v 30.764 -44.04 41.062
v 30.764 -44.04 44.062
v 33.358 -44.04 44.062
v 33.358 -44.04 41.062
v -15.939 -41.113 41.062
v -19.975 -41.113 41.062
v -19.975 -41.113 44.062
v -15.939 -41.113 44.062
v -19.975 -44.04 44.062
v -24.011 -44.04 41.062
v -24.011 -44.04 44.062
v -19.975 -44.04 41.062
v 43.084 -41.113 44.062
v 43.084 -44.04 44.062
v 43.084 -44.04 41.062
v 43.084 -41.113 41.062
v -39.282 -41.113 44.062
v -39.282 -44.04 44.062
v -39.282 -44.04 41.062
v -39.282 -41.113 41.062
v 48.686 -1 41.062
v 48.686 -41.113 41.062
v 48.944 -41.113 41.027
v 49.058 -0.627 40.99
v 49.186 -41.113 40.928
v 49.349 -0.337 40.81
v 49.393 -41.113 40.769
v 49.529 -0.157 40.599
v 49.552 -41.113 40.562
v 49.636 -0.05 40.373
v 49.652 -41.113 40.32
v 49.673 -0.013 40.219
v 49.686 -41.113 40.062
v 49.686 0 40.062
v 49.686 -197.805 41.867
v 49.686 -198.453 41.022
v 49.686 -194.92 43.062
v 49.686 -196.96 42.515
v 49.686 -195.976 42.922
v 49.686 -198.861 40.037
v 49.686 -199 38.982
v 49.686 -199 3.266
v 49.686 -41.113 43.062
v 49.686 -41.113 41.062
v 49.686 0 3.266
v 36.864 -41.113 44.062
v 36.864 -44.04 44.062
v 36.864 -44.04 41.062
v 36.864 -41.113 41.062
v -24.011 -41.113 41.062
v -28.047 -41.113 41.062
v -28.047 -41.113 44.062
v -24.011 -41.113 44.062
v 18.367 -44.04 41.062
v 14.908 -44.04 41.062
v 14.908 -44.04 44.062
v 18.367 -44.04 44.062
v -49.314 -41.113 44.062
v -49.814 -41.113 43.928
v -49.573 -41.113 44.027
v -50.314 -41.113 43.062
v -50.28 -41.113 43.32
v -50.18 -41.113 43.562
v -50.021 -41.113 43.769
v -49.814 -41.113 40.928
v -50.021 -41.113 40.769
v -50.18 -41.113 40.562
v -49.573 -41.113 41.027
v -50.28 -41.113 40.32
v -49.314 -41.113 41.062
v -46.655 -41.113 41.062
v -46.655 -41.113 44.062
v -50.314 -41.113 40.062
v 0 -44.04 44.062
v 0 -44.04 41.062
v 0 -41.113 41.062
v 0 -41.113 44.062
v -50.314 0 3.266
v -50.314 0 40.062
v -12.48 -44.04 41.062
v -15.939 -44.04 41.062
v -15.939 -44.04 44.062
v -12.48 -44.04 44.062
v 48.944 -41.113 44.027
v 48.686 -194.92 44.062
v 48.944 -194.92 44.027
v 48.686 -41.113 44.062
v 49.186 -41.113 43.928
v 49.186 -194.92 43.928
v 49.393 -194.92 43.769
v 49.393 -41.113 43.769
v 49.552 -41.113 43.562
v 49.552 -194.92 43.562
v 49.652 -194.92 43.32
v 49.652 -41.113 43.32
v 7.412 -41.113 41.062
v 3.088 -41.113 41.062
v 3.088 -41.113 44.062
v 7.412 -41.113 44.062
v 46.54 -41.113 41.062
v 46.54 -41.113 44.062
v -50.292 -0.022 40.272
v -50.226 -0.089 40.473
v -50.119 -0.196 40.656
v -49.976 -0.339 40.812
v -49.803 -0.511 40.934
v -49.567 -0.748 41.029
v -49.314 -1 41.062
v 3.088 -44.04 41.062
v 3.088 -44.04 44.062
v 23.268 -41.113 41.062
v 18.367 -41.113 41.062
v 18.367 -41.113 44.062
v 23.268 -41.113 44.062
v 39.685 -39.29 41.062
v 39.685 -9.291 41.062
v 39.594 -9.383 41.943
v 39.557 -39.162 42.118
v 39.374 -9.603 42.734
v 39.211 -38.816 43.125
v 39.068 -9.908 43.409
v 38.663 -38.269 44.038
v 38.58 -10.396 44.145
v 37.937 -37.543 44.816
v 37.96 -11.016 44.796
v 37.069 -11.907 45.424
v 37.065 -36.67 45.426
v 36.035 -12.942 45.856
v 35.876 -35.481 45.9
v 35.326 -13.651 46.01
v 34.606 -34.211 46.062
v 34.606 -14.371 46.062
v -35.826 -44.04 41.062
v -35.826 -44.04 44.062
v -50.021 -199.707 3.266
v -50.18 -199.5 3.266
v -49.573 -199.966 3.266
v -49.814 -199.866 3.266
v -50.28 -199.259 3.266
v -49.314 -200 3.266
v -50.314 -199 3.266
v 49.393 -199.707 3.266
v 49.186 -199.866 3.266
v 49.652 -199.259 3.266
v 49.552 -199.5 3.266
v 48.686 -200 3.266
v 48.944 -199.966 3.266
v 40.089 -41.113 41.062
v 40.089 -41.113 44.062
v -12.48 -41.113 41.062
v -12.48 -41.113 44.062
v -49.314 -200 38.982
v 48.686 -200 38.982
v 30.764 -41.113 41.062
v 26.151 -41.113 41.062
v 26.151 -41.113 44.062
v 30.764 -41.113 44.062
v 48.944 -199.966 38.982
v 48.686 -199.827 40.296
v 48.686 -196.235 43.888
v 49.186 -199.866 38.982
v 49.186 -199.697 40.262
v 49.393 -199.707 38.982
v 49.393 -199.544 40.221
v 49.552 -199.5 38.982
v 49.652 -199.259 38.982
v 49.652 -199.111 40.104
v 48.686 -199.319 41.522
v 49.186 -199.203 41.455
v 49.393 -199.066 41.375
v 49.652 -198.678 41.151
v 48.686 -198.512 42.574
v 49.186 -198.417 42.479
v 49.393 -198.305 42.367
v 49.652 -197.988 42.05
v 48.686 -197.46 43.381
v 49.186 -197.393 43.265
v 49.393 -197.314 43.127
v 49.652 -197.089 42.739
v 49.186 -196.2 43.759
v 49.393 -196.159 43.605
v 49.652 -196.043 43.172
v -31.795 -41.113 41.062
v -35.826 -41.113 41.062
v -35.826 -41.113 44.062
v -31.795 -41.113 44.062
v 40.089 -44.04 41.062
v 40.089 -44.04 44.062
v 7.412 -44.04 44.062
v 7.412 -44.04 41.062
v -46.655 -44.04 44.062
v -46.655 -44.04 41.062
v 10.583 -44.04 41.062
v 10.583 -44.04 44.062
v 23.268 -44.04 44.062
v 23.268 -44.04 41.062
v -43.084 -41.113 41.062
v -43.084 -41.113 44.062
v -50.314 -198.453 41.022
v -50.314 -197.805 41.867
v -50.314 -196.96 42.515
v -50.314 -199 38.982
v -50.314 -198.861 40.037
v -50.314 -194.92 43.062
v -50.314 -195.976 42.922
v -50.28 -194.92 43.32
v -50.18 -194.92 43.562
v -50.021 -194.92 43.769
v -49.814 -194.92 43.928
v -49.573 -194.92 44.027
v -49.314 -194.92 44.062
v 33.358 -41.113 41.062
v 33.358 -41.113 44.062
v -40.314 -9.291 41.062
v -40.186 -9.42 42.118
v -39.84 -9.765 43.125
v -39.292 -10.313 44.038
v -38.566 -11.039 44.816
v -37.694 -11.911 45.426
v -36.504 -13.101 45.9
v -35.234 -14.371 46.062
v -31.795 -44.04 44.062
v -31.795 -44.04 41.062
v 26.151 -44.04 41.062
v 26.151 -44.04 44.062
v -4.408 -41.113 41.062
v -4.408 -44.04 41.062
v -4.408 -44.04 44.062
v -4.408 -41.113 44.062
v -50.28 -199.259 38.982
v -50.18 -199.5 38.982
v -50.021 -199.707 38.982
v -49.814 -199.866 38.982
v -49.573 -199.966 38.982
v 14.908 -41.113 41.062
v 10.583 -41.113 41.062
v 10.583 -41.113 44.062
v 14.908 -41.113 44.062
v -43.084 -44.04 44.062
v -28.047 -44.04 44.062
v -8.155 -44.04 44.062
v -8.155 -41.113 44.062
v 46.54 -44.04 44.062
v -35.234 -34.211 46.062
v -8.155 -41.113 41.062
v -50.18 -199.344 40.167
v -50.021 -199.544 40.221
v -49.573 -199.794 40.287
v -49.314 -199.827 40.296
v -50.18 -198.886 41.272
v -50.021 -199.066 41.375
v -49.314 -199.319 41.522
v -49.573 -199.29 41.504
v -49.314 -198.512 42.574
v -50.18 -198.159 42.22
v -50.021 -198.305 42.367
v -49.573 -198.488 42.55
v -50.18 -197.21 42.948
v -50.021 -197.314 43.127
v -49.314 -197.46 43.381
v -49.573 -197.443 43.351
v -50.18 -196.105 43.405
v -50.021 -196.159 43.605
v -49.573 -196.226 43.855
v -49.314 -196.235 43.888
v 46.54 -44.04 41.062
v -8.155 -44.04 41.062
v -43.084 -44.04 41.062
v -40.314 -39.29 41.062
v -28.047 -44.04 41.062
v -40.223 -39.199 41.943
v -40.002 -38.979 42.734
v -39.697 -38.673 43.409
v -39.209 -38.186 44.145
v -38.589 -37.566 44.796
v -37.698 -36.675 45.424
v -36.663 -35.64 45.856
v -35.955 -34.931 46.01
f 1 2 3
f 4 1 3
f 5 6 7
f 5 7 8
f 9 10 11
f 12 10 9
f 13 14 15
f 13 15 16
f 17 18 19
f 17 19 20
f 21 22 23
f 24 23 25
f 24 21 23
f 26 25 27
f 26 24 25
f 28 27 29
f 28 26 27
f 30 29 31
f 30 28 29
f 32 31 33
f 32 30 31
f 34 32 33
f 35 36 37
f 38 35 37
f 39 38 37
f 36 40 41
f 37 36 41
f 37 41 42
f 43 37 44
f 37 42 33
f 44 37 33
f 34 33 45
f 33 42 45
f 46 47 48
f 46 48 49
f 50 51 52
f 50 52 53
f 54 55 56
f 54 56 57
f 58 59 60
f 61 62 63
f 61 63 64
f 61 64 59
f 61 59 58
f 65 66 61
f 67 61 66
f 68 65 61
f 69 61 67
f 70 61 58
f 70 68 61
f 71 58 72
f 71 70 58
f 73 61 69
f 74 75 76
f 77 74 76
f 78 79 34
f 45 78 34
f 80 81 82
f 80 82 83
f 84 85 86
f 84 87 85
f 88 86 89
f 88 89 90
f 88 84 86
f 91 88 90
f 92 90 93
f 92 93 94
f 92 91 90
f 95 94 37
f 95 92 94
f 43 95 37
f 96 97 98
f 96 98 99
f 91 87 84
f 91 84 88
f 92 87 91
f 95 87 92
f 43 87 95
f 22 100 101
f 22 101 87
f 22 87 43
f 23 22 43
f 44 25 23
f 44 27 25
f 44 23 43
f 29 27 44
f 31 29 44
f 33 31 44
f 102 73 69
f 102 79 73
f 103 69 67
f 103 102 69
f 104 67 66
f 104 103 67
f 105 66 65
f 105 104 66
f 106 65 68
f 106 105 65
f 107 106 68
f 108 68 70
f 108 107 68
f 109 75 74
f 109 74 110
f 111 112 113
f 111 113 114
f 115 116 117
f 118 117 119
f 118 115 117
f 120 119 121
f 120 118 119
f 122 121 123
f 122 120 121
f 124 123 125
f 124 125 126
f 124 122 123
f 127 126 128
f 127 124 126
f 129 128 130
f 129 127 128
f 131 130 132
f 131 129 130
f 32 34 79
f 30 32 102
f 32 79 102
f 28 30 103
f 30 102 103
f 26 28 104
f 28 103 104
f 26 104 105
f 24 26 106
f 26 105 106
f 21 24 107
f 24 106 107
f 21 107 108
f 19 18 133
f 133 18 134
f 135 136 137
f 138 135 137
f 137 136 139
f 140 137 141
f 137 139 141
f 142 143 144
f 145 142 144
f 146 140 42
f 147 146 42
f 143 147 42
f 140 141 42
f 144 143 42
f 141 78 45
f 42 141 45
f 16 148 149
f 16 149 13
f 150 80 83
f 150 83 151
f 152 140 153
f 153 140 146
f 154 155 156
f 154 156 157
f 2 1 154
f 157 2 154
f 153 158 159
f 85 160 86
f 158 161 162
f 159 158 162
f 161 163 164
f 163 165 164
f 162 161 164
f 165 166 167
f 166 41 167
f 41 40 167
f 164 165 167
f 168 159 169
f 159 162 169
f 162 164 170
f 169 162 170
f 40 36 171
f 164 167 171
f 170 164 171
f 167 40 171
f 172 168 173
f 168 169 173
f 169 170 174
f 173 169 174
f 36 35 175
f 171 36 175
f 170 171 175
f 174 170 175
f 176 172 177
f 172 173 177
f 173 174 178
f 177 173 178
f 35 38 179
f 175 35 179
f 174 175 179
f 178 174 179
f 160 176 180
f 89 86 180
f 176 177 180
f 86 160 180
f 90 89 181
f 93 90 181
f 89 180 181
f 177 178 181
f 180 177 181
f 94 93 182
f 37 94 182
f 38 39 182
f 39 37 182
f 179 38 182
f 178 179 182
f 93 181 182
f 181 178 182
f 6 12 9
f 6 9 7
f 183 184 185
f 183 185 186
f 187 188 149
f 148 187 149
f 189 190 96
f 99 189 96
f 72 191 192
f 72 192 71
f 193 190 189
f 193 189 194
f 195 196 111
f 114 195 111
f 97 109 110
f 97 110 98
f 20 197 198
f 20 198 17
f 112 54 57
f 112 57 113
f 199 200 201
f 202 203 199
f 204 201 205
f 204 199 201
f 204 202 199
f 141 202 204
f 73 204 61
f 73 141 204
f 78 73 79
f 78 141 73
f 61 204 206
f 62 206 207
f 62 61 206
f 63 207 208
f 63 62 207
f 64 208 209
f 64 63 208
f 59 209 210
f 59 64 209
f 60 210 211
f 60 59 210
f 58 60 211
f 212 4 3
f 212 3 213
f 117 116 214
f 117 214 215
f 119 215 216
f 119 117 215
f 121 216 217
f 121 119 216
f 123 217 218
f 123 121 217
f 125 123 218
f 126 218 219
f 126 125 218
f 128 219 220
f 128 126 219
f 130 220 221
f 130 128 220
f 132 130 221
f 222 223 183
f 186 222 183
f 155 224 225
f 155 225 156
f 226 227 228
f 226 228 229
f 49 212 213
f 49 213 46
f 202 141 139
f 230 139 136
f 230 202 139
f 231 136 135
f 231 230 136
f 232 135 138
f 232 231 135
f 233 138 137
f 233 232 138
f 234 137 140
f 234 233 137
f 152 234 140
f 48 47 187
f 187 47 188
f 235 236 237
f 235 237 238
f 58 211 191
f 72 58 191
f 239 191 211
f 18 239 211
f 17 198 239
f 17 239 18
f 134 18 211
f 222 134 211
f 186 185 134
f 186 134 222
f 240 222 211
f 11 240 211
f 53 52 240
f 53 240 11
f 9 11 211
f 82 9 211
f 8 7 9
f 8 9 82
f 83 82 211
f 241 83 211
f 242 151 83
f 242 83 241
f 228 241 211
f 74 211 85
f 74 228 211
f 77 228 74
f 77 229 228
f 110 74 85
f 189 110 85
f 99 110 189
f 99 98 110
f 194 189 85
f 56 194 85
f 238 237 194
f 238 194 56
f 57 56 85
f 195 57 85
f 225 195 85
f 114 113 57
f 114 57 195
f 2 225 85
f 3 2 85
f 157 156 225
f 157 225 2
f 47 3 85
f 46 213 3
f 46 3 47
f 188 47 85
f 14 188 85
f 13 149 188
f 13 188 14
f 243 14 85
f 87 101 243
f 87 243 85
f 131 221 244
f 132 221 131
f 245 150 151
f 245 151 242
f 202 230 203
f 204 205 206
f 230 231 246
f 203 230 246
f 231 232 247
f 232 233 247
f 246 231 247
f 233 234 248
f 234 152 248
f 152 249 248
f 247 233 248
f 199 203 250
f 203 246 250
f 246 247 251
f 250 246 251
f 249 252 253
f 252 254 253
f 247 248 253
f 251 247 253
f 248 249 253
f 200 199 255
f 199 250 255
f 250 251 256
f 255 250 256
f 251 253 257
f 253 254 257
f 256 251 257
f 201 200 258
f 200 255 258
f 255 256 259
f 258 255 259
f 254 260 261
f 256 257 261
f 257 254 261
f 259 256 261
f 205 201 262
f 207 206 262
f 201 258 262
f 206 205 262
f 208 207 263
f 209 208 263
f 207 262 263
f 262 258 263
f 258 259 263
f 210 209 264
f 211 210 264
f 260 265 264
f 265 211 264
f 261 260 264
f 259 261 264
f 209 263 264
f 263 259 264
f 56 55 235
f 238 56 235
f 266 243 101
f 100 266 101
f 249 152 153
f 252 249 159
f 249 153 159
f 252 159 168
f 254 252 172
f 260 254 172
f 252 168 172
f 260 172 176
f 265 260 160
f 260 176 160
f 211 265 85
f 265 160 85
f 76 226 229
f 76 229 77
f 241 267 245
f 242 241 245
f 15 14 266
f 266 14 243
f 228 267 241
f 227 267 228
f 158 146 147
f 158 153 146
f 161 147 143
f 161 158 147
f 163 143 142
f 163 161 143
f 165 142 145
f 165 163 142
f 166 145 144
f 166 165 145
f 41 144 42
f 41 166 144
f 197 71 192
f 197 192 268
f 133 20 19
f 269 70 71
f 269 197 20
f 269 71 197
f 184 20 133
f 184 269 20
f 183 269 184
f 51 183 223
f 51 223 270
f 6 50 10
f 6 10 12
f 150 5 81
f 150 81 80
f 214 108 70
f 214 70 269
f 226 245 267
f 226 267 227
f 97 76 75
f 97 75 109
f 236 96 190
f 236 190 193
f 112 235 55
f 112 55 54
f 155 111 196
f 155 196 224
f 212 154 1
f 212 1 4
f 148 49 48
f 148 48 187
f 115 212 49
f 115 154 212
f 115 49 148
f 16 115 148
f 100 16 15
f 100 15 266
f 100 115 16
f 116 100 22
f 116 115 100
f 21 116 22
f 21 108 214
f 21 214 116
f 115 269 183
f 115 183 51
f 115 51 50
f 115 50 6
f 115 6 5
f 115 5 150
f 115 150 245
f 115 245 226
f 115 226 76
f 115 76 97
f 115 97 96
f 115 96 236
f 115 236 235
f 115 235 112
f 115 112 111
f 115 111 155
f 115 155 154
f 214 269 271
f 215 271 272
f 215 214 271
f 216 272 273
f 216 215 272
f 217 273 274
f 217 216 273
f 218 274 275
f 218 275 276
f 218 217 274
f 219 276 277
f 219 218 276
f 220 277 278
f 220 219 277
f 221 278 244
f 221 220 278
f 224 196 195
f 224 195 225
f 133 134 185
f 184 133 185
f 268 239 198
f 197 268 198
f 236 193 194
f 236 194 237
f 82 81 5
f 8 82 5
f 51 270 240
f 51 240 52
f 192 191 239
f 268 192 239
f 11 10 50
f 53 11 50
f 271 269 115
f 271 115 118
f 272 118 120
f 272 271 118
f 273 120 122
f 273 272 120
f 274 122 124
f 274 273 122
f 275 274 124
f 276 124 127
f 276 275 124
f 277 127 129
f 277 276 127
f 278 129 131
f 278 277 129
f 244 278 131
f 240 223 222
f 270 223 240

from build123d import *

# Parameters (mm, degrees)
F0_W         = 100
F0_H         = 37.7952754252
F1_DEPTH     = 200
F2_W         = 80
F2_H         = 30
F3_DEPTH     = 5
F4_T4_DEPTH  = 55.4
F4_T9_DEPTH  = 105.4
F4_T14_DEPTH = 55.4
F4_T19_DEPTH = 105.4
F5_W         = 100
F5_H         = 155.959841609
F6_DEPTH     = 3
F7_W         = 18.5192480683
F7_H         = 2.9272809625
F7_W_2       = 4.0360428393
F7_W_3       = 4.3243318796
F7_W_4       = 4.4076992199
F7_W_5       = 4.324331414
F7_W_6       = 4.9009080976
F7_W_7       = 4.6126190573
F7_W_8       = 16.3274921477
F8_DEPTH     = 3
F9_W         = 3.4559369087
F9_H         = 2.9272809625
F9_W_2       = 3.5711340606
F9_W_3       = 3.2255388796
F10_DEPTH    = 3
F11_R        = 5.08
F12_R        = 1


# Not quite as in the source:
# - a fillet or chamfer that OpenCascade refuses, or shapes differently, is made with other operations: its cross-section is extruded or revolved along the edge and cut away or added


with BuildPart() as f1:
    # F0 (on Front) → F1 (new body)
    with BuildSketch(Plane.XZ):
        with Locations((-0.3143809736, 22.1638707444)):
            Rectangle(F0_W, F0_H)
    extrude(amount=F1_DEPTH)

    # F2 (on face) → F3 (join)
    with BuildSketch(Plane.XY.offset(41.061508457)):
        with Locations((-0.3143809736, -24.2907730862)):
            Rectangle(F2_W, F2_H)
    extrude(amount=F3_DEPTH)

    # F4: fillet of radius 5.08 on 4 edges, made by hand


with BuildPart() as f4_tool2:
    # F4_s3 → F4_t4 (new body)
    with BuildSketch(Plane.XZ.offset(51.9907730862)):
        with BuildLine():
            ThreePointArc((39.6856190264, 40.981508457), (38.1977214749, 44.5736109055), (34.6056190264, 46.061508457))
            Line((34.6056190264, 46.061508457), (39.6856190264, 46.061508457))
            Line((39.6856190264, 46.061508457), (39.6856190264, 40.981508457))
        make_face()
    extrude(amount=-F4_T4_DEPTH)

    split(bisect_by=Plane.XY.offset(41.061508457), keep=Keep.TOP)


with BuildPart() as f1_1:
    add(f1.part)

    # F4_t1: cut F4_tool2
    add(f4_tool2.part, mode=Mode.SUBTRACT)


with BuildPart() as f4_tool7:
    # F4_s8 → F4_t9 (new body)
    with BuildSketch(Plane.YZ.offset(52.3856190264)):
        with BuildLine():
            ThreePointArc((-9.2907730862, 40.981508457), (-10.7786706378, 44.5736109055), (-14.3707730862, 46.061508457))
            Line((-14.3707730862, 46.061508457), (-9.2907730862, 46.061508457))
            Line((-9.2907730862, 46.061508457), (-9.2907730862, 40.981508457))
        make_face()
    extrude(amount=-F4_T9_DEPTH)

    split(bisect_by=Plane.XY.offset(41.061508457), keep=Keep.TOP)


with BuildPart() as f1_2:
    add(f1_1.part)

    # F4_t6: cut F4_tool7
    add(f4_tool7.part, mode=Mode.SUBTRACT)


with BuildPart() as f4_tool12:
    # F4_s13 → F4_t14 (new body)
    with BuildSketch(Plane.XZ.offset(-3.4092269138)):
        with BuildLine():
            ThreePointArc((-40.3143809736, 40.981508457), (-38.826483422, 44.5736109055), (-35.2343809736, 46.061508457))
            Line((-35.2343809736, 46.061508457), (-40.3143809736, 46.061508457))
            Line((-40.3143809736, 46.061508457), (-40.3143809736, 40.981508457))
        make_face()
    extrude(amount=F4_T14_DEPTH)

    split(bisect_by=Plane.XY.offset(41.061508457), keep=Keep.TOP)


with BuildPart() as f1_3:
    add(f1_2.part)

    # F4_t11: cut F4_tool12
    add(f4_tool12.part, mode=Mode.SUBTRACT)


with BuildPart() as f4_tool17:
    # F4_s18 → F4_t19 (new body)
    with BuildSketch(Plane.YZ.offset(-53.0143809736)):
        with BuildLine():
            ThreePointArc((-39.2907730862, 40.981508457), (-37.8028755347, 44.5736109055), (-34.2107730862, 46.061508457))
            Line((-34.2107730862, 46.061508457), (-39.2907730862, 46.061508457))
            Line((-39.2907730862, 46.061508457), (-39.2907730862, 40.981508457))
        make_face()
    extrude(amount=F4_T19_DEPTH)

    split(bisect_by=Plane.XY.offset(41.061508457), keep=Keep.TOP)


with BuildPart() as f1_4:
    add(f1_3.part)

    # F4_t16: cut F4_tool17
    add(f4_tool17.part, mode=Mode.SUBTRACT)

    # F5 (on face) → F6 (join)
    with BuildSketch(Plane.XY.offset(41.061508457)):
        with Locations((-0.3143809736, -122.0200791955)):
            Rectangle(F5_W, F5_H)
    extrude(amount=F6_DEPTH)

    # F7 (on face) → F8 (join)
    with BuildSketch(Plane.XY.offset(41.061508457)):
        with Locations((-41.0547569394, -42.5765179098)):
            Rectangle(F7_W, F7_H)
        with Locations((-26.0293576866, -42.5765179098)):
            Rectangle(F7_W_2, F7_H)
        with Locations((-17.9572720081, -42.5765179098)):
            Rectangle(F7_W_2, F7_H)
        with Locations((-10.31761989, -42.5765179098)):
            Rectangle(F7_W_3, F7_H)
        with Locations((-2.2038496099, -42.5765179098)):
            Rectangle(F7_W_4, F7_H)
        with Locations((5.2499750163, -42.5765179098)):
            Rectangle(F7_W_5, F7_H)
        with Locations((12.7454819158, -42.5765179098)):
            Rectangle(F7_W_3, F7_H)
        with Locations((20.817569457, -42.5765179098)):
            Rectangle(F7_W_6, F7_H)
        with Locations((28.4572215751, -42.5765179098)):
            Rectangle(F7_W_7, F7_H)
        with Locations((41.5218729526, -42.5765179098)):
            Rectangle(F7_W_8, F7_H)
    extrude(amount=F8_DEPTH)

    # F9 (on face) → F10 (cut)
    with BuildSketch(Plane.XY.offset(44.061508457)):
        with Locations((-37.5542342663, -42.5765179098)):
            Rectangle(F9_W, F9_H)
        with Locations((-44.8692981154, -42.5765179098)):
            Rectangle(F9_W_2, F9_H)
        with Locations((38.4763423353, -42.5765179098)):
            Rectangle(F9_W_3, F9_H)
        with Locations((44.8122248054, -42.5765179098)):
            Rectangle(F9_W, F9_H)
    extrude(amount=-F10_DEPTH, mode=Mode.SUBTRACT)

    # F11
    f11_edges = [f1_4.edges().sort_by_distance(p)[0] for p in [
        (-0.314381, -200, 44.061508),
    ]]
    fillet(f11_edges, radius=F11_R)

    # F12
    f12_edges = [f1_4.edges().sort_by_distance(p)[0] for p in [
        (49.685619, -20.556439, 41.061508),
        (-0.314381, 0, 41.061508),
        (-50.314381, -20.556439, 41.061508),
        (-50.314381, -118.016439, 44.061508),
        (49.685619, -118.016439, 44.061508),
    ]]
    fillet(f12_edges, radius=F12_R)


solid = f1_4.part
